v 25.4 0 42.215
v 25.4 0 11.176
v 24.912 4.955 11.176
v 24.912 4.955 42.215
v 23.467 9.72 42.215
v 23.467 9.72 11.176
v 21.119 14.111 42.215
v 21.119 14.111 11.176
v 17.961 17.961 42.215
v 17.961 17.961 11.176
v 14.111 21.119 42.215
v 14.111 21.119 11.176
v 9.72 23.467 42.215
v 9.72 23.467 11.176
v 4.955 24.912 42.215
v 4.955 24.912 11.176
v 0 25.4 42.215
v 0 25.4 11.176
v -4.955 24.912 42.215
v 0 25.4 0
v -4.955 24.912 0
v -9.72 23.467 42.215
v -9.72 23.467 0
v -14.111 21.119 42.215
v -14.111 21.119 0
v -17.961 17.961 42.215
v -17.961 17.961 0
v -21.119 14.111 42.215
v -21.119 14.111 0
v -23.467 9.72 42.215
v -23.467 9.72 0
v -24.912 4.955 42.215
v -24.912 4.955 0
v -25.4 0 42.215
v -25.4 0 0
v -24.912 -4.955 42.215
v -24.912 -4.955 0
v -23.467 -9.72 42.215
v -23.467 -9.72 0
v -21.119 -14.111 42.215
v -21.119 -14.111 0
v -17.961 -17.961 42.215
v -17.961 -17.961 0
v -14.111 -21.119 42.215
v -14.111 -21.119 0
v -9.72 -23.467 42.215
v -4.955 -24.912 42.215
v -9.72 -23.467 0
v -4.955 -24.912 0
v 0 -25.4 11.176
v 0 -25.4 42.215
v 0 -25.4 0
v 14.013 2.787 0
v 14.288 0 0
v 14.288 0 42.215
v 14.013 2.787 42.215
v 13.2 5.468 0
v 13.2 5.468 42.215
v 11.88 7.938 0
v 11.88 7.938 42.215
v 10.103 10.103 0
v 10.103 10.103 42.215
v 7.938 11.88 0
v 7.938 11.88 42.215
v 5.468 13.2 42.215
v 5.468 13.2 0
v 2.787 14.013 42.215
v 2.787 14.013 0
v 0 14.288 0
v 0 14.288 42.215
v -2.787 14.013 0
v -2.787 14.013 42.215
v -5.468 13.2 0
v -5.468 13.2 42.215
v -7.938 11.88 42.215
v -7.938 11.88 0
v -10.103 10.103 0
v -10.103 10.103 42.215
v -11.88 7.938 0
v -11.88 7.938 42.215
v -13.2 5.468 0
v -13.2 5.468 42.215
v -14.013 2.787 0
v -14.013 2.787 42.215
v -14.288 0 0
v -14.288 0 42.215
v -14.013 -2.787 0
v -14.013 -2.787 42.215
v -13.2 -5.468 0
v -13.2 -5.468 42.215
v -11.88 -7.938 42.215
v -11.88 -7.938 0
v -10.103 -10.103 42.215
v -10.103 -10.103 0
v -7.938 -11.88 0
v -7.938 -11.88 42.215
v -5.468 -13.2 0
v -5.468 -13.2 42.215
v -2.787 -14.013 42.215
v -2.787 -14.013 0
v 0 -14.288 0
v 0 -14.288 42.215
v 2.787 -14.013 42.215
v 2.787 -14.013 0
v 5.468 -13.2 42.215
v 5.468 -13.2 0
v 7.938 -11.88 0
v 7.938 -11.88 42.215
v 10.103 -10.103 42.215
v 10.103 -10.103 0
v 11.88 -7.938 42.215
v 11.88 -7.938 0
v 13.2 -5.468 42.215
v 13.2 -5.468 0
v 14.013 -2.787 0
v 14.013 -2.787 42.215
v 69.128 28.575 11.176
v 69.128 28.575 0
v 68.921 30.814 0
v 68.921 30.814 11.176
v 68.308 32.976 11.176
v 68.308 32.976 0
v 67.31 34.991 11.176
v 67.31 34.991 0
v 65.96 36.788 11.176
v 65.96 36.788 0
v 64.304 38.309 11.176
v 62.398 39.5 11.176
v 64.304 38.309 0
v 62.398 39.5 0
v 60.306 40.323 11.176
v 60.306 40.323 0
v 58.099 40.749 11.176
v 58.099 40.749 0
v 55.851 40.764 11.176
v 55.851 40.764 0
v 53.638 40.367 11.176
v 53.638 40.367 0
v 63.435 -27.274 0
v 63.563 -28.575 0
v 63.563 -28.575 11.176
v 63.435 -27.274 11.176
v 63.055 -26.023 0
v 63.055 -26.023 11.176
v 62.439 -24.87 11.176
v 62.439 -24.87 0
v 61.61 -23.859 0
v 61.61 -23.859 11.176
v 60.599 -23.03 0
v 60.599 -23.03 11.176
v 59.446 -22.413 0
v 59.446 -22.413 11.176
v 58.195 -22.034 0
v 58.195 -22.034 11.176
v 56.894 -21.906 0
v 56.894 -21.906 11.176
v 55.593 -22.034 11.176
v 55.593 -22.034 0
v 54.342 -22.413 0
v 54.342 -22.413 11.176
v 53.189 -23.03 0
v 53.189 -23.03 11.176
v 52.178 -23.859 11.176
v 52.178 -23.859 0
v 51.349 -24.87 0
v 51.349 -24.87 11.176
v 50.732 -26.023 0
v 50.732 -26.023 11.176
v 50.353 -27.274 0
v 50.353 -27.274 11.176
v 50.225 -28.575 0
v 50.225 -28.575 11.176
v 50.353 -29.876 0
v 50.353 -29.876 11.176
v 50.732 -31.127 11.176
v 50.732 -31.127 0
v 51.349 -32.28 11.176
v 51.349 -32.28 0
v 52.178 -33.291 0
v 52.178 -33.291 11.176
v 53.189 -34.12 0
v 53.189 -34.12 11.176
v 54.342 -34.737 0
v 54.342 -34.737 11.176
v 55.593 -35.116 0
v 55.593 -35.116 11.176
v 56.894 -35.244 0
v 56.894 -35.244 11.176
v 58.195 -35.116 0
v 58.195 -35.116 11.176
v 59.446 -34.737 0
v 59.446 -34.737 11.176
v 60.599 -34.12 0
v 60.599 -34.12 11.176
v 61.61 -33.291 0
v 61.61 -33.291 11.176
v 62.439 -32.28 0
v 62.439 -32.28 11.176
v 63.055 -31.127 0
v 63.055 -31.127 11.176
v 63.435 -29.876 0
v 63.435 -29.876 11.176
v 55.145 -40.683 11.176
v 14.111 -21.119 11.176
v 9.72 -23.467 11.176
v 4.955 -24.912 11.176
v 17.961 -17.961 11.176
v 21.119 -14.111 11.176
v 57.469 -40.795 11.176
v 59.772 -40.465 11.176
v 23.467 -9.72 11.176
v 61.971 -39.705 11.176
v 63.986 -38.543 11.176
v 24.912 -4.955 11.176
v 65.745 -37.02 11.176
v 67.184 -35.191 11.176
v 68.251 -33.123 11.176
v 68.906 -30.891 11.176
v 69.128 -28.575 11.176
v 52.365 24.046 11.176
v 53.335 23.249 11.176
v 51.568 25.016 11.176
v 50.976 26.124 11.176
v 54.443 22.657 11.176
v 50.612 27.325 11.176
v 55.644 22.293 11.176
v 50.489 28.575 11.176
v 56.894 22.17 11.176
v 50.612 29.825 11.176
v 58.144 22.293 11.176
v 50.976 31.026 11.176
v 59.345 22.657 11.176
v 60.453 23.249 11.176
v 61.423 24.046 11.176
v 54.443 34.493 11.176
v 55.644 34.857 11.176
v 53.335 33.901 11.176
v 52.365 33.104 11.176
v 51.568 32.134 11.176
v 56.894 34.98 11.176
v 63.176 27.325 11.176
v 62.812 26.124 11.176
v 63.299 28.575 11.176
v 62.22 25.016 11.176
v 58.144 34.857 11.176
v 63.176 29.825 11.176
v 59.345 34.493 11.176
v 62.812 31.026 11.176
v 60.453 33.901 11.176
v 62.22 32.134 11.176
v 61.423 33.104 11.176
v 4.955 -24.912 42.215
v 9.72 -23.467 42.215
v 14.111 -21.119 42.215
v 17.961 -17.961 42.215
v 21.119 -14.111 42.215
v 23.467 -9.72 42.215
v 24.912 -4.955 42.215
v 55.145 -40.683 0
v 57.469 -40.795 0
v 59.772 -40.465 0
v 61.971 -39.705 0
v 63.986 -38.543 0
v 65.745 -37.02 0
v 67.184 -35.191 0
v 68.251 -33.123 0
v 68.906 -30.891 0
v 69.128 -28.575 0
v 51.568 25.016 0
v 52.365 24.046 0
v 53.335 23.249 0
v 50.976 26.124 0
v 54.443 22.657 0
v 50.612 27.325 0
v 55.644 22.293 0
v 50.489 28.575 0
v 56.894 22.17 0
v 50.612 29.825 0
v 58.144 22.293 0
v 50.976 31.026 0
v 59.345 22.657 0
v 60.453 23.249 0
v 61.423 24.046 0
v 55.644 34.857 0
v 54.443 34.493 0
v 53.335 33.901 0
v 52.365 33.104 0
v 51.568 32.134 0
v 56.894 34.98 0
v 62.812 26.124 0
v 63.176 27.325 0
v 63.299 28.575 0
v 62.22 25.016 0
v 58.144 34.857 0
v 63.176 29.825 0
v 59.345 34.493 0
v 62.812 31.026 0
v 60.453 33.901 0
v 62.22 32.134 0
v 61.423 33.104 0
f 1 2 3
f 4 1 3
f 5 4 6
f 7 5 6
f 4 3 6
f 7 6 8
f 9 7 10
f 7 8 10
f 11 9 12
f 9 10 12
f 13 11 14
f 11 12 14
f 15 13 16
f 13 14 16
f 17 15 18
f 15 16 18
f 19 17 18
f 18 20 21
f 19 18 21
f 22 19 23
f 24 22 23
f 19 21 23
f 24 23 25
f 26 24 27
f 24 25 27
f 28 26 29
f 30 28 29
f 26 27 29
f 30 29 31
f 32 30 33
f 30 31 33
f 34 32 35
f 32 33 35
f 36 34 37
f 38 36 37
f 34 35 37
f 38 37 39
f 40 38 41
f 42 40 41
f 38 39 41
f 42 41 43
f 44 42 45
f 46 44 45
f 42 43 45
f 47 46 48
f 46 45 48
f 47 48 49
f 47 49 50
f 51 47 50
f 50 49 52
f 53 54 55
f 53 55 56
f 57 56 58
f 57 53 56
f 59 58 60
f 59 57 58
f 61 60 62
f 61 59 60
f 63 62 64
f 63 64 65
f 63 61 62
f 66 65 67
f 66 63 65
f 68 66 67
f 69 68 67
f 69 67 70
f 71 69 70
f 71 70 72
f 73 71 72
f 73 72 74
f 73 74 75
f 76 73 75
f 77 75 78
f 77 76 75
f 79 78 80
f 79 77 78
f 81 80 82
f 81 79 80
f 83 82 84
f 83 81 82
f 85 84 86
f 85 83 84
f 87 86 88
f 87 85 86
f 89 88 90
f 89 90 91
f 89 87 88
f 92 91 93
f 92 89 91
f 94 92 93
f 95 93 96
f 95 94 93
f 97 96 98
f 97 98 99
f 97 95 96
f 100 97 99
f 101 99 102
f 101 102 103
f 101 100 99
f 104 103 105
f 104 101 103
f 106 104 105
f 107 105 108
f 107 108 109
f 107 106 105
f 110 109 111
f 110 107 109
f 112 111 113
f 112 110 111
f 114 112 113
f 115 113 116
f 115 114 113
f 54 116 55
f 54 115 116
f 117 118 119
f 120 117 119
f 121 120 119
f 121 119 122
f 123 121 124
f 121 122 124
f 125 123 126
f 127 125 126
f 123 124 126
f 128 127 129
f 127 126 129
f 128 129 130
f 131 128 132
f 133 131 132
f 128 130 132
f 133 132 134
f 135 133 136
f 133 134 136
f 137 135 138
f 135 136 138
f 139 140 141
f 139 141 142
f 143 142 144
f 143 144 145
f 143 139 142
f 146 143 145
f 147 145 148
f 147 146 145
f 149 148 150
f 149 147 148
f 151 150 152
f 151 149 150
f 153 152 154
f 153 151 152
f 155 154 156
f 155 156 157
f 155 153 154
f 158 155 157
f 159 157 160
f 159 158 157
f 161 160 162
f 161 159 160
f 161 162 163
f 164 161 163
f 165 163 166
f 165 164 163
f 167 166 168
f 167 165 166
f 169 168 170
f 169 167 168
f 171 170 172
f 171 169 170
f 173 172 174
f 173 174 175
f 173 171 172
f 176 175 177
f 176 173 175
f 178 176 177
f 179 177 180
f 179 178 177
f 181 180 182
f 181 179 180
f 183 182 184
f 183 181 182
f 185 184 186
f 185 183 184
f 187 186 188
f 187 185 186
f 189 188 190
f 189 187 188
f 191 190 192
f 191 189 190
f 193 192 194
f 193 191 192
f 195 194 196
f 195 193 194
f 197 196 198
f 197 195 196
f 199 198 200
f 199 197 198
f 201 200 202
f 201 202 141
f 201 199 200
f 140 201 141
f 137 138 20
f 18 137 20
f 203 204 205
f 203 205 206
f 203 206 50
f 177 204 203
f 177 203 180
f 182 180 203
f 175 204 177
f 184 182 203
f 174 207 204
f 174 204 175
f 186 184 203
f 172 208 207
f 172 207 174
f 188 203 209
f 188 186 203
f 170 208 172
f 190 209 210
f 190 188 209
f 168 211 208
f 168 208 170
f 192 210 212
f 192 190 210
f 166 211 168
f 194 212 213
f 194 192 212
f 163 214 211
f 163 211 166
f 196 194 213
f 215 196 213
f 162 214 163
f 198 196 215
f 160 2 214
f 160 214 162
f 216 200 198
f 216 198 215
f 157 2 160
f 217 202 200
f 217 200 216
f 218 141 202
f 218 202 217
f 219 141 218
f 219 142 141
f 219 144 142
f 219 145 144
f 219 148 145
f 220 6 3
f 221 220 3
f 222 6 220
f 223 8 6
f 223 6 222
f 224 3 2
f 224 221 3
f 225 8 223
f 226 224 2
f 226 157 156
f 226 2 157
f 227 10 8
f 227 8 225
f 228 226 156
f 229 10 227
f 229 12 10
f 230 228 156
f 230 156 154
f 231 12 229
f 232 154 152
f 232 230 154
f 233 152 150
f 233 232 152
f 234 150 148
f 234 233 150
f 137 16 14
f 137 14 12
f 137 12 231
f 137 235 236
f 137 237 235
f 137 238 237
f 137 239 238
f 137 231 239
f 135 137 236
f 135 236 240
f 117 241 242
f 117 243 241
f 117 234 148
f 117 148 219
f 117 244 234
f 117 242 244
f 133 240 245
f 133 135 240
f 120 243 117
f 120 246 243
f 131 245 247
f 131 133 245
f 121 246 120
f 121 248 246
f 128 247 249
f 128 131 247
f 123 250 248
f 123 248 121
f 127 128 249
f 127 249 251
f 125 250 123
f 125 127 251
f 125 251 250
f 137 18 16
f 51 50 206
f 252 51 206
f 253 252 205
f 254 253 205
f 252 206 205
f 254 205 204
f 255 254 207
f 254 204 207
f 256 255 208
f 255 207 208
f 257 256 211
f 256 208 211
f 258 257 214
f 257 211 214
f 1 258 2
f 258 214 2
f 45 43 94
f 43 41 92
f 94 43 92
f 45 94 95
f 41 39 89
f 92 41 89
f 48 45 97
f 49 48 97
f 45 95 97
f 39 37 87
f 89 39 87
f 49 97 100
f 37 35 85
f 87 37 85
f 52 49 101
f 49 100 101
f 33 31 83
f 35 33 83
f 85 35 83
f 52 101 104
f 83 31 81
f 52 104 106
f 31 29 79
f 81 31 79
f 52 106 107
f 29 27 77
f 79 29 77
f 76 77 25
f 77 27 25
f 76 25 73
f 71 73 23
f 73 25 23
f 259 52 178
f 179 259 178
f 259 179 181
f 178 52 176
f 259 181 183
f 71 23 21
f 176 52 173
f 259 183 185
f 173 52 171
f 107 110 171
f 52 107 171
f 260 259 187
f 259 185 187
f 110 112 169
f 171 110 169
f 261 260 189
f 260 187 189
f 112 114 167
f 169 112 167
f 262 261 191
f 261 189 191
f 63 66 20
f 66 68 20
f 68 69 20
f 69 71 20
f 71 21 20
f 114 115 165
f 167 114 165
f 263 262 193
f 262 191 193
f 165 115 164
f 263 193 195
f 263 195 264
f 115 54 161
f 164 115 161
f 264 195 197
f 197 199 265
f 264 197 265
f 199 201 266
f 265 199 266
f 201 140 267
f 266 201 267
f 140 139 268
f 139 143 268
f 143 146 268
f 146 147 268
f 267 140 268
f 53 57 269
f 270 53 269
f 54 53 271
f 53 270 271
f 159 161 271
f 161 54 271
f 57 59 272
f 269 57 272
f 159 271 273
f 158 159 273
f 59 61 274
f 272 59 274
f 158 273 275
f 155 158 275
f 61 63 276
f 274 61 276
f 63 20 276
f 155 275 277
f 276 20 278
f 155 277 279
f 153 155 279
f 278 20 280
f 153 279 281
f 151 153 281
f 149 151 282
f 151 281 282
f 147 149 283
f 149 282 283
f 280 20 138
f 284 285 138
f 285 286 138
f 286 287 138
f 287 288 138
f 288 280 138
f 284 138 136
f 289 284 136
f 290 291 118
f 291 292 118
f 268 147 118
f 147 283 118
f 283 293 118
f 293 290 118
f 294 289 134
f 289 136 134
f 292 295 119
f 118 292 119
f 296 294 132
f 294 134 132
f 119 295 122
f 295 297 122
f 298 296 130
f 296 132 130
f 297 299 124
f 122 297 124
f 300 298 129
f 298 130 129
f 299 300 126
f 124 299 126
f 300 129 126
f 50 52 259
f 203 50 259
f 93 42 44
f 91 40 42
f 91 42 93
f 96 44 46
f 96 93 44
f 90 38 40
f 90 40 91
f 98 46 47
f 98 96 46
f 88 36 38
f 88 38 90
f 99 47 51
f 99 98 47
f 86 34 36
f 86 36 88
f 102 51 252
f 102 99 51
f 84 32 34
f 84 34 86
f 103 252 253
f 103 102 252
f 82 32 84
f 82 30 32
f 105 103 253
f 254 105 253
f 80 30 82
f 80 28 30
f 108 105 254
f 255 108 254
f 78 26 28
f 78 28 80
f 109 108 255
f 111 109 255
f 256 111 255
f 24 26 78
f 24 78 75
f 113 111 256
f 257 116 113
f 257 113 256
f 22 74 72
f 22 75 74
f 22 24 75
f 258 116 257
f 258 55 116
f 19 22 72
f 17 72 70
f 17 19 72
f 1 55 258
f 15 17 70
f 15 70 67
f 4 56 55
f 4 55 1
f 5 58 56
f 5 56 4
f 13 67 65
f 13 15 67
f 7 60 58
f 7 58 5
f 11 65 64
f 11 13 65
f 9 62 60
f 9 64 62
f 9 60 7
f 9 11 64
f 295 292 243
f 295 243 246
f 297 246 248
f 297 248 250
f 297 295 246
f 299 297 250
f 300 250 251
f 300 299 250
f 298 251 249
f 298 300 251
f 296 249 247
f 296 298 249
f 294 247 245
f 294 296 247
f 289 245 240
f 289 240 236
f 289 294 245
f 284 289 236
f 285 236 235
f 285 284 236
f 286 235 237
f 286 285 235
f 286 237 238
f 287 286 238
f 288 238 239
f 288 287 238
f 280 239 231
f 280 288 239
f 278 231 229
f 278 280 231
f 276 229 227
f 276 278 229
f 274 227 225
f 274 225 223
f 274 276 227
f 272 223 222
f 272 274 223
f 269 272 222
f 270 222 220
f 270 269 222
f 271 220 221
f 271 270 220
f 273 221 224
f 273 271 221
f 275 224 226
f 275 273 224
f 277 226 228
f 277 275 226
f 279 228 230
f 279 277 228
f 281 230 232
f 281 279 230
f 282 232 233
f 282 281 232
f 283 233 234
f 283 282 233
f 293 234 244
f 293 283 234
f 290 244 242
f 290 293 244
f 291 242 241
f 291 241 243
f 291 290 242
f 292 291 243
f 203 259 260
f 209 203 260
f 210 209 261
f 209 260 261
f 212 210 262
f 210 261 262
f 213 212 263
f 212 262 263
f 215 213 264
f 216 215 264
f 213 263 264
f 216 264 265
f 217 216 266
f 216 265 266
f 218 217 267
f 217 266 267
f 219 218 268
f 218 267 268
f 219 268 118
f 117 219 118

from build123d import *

# Parameters (mm, degrees)
F0_R     = 14.2875
F1_DEPTH = 42.2148
F0_R_2   = 6.669194
F0_R_3   = 6.405374
F2_DEPTH = 11.176


with BuildPart() as f1:
    # F0 (on Top) → F1 (new body)
    with BuildSketch(Plane.XY):
        with BuildLine():
            ThreePointArc((0, -25.4), (17.960512, -17.960512), (25.4, 0))
            ThreePointArc((25.4, 0), (17.960512, 17.960512), (0, 25.4))
            ThreePointArc((0, 25.4), (-25.4, 0), (0, -25.4))
        make_face()
        Circle(F0_R, mode=Mode.SUBTRACT)
    extrude(amount=F1_DEPTH)

    # F0 (on Top) → F2 (join)
    with BuildSketch(Plane.XY):
        with BuildLine():
            ThreePointArc((0, 25.4), (17.960512, 17.960512), (25.4, 0))
            ThreePointArc((25.4, 0), (17.960512, -17.960512), (0, -25.4))
            Line((0, -25.4), (55.144853, -40.682886))
            ThreePointArc((55.144853, -40.682886), (64.902158, -37.823193), (69.127533, -28.575))
            Line((69.127533, -28.575), (69.127533, 28.575))
            ThreePointArc((69.127533, 28.575), (64.304451, 38.308701), (53.638201, 40.367384))
            Line((53.638201, 40.367384), (0, 25.4))
        make_face()
        with Locations((56.893961, -28.575)):
            Circle(F0_R_2, mode=Mode.SUBTRACT)
        with Locations((56.893961, 28.575)):
            Circle(F0_R_3, mode=Mode.SUBTRACT)
    extrude(amount=F2_DEPTH)


solid = f1.part
